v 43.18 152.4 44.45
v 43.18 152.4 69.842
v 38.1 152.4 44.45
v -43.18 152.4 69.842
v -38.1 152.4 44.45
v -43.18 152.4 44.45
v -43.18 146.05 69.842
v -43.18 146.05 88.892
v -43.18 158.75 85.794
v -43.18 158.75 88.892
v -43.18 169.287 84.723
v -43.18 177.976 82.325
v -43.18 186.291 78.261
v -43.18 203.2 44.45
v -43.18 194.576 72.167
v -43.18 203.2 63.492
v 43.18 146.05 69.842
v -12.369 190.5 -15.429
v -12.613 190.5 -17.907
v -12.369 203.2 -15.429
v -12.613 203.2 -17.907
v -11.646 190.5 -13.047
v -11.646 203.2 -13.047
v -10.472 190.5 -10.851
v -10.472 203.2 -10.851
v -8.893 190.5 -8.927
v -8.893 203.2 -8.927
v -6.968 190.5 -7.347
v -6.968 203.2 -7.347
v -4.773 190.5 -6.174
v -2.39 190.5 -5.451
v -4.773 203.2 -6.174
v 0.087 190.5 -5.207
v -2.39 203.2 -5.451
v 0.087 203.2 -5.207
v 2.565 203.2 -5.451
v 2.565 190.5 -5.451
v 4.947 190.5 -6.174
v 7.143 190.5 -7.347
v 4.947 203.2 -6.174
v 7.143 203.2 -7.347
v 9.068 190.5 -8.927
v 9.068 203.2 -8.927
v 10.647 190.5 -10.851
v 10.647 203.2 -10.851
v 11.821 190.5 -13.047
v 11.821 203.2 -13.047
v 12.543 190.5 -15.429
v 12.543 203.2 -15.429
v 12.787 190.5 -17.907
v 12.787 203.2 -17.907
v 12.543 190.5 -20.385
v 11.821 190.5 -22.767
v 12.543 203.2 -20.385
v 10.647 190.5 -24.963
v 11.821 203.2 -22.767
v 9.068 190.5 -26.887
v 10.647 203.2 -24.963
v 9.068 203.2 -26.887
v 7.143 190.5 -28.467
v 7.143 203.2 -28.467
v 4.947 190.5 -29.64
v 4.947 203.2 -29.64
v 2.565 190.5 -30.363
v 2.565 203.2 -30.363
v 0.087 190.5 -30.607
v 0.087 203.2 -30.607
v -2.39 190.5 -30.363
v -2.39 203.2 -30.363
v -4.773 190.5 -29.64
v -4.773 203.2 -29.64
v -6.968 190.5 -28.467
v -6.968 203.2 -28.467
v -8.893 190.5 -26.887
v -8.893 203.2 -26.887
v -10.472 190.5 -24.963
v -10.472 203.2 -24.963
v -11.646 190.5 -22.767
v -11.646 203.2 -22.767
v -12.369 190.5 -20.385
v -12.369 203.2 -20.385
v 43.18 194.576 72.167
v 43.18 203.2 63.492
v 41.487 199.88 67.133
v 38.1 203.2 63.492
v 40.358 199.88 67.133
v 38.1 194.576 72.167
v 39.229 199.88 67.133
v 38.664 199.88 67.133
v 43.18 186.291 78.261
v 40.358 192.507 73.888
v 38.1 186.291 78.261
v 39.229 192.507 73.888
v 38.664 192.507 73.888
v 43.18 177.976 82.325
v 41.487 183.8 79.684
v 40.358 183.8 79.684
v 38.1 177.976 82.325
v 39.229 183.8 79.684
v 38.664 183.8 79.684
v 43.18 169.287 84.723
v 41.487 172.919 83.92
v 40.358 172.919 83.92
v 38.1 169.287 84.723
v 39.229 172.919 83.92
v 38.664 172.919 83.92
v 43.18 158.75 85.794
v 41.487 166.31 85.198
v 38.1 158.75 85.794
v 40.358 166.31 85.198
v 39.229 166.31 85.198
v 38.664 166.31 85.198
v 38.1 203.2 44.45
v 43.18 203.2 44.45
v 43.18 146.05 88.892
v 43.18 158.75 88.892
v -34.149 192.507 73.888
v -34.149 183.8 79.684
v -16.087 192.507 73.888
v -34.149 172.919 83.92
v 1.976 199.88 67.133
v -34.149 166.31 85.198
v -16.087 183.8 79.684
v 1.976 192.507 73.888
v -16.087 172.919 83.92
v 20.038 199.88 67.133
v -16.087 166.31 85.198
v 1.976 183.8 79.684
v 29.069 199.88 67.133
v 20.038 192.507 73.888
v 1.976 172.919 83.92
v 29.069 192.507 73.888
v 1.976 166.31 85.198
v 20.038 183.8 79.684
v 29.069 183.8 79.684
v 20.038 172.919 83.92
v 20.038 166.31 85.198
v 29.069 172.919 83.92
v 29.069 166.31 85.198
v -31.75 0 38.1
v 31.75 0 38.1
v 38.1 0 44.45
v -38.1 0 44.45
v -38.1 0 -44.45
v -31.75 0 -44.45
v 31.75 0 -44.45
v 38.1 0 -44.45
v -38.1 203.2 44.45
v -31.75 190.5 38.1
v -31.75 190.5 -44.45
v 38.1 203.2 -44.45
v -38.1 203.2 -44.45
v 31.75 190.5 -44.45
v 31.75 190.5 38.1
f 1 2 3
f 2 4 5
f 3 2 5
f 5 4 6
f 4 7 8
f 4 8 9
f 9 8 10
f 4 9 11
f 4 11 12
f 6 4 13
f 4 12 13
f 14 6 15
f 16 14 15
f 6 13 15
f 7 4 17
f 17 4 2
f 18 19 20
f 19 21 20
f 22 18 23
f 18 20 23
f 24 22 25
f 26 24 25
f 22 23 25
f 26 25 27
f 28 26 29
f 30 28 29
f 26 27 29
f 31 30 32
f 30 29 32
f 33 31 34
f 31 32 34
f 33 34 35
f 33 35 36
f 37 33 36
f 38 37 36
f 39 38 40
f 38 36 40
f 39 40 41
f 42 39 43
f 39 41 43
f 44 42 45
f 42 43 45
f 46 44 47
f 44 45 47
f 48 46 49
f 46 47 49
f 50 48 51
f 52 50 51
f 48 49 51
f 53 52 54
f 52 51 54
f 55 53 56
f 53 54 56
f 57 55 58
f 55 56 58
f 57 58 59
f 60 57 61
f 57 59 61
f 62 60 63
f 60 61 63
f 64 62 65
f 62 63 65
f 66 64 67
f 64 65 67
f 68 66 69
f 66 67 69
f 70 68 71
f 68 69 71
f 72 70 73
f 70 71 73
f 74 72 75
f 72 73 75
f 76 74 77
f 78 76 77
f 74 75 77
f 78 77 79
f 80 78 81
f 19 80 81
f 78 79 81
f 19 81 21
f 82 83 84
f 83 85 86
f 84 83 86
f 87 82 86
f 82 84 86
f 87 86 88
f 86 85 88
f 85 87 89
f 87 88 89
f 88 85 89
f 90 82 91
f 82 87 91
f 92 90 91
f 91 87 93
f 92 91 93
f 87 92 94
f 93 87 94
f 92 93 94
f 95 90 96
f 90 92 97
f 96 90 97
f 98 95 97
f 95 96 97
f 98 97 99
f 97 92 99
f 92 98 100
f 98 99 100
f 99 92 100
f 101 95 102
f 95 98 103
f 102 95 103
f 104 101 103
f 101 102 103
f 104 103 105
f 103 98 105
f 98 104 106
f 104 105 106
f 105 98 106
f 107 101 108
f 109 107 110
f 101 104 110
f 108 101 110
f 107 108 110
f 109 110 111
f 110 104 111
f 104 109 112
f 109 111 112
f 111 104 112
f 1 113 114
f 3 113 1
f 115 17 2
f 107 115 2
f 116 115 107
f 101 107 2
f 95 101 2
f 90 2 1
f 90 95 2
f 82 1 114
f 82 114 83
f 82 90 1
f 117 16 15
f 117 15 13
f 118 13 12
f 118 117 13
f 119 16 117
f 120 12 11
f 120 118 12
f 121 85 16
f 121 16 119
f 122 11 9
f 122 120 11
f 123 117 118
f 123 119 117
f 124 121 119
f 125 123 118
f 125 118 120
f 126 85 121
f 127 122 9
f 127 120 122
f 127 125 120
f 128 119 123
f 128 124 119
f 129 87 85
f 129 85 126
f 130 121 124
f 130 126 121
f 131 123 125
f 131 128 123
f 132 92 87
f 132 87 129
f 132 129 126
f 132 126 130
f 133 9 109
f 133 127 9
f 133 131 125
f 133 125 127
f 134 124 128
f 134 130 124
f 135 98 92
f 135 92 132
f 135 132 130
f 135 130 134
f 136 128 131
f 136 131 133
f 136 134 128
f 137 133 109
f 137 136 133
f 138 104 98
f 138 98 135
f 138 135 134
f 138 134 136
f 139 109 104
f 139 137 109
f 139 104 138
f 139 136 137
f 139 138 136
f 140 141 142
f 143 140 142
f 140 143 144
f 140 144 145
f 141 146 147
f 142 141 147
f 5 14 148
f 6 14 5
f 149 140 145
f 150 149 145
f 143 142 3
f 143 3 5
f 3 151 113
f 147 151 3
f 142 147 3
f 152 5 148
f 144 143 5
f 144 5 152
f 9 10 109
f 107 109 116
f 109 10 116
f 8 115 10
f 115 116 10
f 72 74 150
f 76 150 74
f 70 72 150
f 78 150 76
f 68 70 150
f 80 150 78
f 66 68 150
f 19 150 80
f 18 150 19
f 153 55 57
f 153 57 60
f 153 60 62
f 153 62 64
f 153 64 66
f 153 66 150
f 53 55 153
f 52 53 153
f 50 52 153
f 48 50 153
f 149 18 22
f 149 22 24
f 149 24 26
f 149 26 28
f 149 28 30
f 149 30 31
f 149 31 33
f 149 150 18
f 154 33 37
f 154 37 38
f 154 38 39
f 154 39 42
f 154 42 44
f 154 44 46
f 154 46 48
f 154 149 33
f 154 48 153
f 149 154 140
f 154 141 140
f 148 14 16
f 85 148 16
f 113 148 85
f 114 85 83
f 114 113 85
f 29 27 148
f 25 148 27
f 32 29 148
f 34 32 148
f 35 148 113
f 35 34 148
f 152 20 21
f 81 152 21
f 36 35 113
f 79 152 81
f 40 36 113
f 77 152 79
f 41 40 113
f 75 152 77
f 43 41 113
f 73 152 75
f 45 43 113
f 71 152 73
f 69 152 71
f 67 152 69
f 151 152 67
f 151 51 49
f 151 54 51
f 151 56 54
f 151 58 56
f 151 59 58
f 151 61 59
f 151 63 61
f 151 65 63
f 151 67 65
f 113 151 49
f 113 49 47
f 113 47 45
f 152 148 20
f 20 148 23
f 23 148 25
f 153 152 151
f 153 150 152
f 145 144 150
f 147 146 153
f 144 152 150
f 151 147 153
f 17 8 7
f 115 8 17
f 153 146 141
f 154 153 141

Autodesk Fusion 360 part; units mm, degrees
sketch "Sketch2" plane through (0, 0, 0) normal (0, 1, 0) x (1, 0, 0)
  line L0 (38.1, -44.45) -> (-38.1, -44.45)
  line L1 (-38.1, -44.45) -> (-38.1, 44.45)
  line L2 (-38.1, 44.45) -> (38.1, 44.45)
  line L3 (38.1, 44.45) -> (38.1, -44.45)
  line L4 (38.1, -44.45) -> (-38.1, 44.45) construction
  line L5 (-38.1, -44.45) -> (38.1, 44.45) construction
  dimension "d3" = 76.2
  dimension "d4" = 88.9
extrude "Extrude1" add sketch "Sketch2" along normal blind 203.2
sketch "Sketch3" plane through (0, 0, 0) normal (0, -1, 0) x (1, 0, 0)
  line L0 (-38.1, -44.45) -> (38.1, -44.45)
  line L1 (38.1, -44.45) -> (38.1, 44.45)
  line L2 (38.1, 44.45) -> (-38.1, 44.45)
  line L3 (-38.1, 44.45) -> (-38.1, -44.45)
  line L4 (-31.75, -44.45) -> (31.75, -44.45)
  line L5 (31.75, -44.45) -> (31.75, 38.1)
  line L6 (31.75, 38.1) -> (-31.75, 38.1)
  line L7 (-31.75, 38.1) -> (-31.75, -44.45)
  dimension "d7" = 63.5
  dimension "d8" = 6.35
  dimension "d9" = 6.35
extrude "Extrude2" cut sketch "Sketch3" against normal blind 190.5 contours L0 L4 L5 L6 L7
sketch "Sketch4" plane through (38.1, 0, 0) normal (1, 0, 0) x (0, 1, 0)
  line L0 (0, 44.45) -> (0, -44.45)
  line L1 (0, -44.45) -> (203.2, -44.45)
  line L2 (203.2, -44.45) -> (203.2, 44.45)
  line L3 (203.2, 44.45) -> (0, 44.45)
  line L4 (152.4, 63.4925) -> (203.2, 63.4925)
  line L5 (152.4, 63.4925) -> (152.4, 69.8425)
  line L6 (152.4, 69.8425) -> (158.75, 69.8425)
  line L7 (158.75, 69.8425) -> (158.75, 85.7937)
  line L8 (152.4, 63.4925) -> (152.4, 44.45)
  line L9 (203.2, 63.4925) -> (203.2, 44.45)
  spline S0 degree 5 poles (203.2, 63.4925) (202.0453, 64.8323) (199.6635, 67.4597) (195.8735, 71.2447) (190.3554, 75.9576) (182.304, 81.0202) (174.3584, 83.9897) (167.1278, 85.3037) (161.6519, 85.7089) (158.75, 85.7937) knots 0 0 0 0 0 0 0.2 0.4 0.6 0.8 1 1 1 1 1 1
  line L10 (165.8196, 85.5871) -> (151.6804, 86.0004)
  dimension "d12" = 50.8
  dimension "d13" = 6.35
  dimension "d14" = 15.9512
  dimension "d27" = 19.0426
  dimension "d28" = 6.35
extrude "Extrude3" add sketch "Sketch4" along normal blind 5.08 and the other way blind 81.28 contours L3 L4 L8 L9 | L4 L5 L6 L7 S0
sketch "Sketch5" plane through (0, 158.75, 0) normal (0, -1, 0) x (1, 0, 0)
  line L0 (43.18, 69.8425) -> (43.18, 85.7937)
  line L1 (-43.18, 69.8425) -> (43.18, 69.8425)
  line L2 (-43.18, 85.7937) -> (-43.18, 69.8425)
  line L3 (43.18, 69.8425) -> (-43.18, 69.8425)
  line L4 (-43.18, 69.8425) -> (43.18, 69.8425)
  line L5 (43.18, 69.8425) -> (43.18, 88.8925)
  line L6 (43.18, 88.8925) -> (-43.18, 88.8925)
  line L7 (-43.18, 88.8925) -> (-43.18, 69.8425)
  line L8 (43.18, 85.7937) -> (-43.18, 85.7937)
  dimension "d26" = 19.05
extrude "Extrude4" add sketch "Sketch5" along normal blind 12.7
sketch "Sketch6" plane through (0, 203.2, 0) normal (0, 1, 0) x (-1, 0, 0)
  line L0 (-38.1, -44.45) -> (38.1, -44.45)
  line L1 (38.1, -44.45) -> (38.1, 44.45)
  line L2 (38.1, 44.45) -> (43.18, 44.45)
  line L3 (-43.18, 63.4925) -> (-43.18, 44.45)
  line L4 (43.18, 44.45) -> (43.18, 63.4925)
  line L5 (-38.1, 44.45) -> (-38.1, -44.45)
  circle A0 centre (-0.0873, -17.907) radius 12.7
  line L6 (-0.0873, 10.16) -> (-0.0873, -53.34) construction
  line L7 (43.18, 63.4925) -> (-43.18, 63.4925)
  line L8 (-43.18, 44.45) -> (-38.1, 44.45)
  dimension "d23" = 25.4
  dimension "d25" = 26.543
extrude "Extrude5" cut sketch "Sketch6" against normal through all contours A0
